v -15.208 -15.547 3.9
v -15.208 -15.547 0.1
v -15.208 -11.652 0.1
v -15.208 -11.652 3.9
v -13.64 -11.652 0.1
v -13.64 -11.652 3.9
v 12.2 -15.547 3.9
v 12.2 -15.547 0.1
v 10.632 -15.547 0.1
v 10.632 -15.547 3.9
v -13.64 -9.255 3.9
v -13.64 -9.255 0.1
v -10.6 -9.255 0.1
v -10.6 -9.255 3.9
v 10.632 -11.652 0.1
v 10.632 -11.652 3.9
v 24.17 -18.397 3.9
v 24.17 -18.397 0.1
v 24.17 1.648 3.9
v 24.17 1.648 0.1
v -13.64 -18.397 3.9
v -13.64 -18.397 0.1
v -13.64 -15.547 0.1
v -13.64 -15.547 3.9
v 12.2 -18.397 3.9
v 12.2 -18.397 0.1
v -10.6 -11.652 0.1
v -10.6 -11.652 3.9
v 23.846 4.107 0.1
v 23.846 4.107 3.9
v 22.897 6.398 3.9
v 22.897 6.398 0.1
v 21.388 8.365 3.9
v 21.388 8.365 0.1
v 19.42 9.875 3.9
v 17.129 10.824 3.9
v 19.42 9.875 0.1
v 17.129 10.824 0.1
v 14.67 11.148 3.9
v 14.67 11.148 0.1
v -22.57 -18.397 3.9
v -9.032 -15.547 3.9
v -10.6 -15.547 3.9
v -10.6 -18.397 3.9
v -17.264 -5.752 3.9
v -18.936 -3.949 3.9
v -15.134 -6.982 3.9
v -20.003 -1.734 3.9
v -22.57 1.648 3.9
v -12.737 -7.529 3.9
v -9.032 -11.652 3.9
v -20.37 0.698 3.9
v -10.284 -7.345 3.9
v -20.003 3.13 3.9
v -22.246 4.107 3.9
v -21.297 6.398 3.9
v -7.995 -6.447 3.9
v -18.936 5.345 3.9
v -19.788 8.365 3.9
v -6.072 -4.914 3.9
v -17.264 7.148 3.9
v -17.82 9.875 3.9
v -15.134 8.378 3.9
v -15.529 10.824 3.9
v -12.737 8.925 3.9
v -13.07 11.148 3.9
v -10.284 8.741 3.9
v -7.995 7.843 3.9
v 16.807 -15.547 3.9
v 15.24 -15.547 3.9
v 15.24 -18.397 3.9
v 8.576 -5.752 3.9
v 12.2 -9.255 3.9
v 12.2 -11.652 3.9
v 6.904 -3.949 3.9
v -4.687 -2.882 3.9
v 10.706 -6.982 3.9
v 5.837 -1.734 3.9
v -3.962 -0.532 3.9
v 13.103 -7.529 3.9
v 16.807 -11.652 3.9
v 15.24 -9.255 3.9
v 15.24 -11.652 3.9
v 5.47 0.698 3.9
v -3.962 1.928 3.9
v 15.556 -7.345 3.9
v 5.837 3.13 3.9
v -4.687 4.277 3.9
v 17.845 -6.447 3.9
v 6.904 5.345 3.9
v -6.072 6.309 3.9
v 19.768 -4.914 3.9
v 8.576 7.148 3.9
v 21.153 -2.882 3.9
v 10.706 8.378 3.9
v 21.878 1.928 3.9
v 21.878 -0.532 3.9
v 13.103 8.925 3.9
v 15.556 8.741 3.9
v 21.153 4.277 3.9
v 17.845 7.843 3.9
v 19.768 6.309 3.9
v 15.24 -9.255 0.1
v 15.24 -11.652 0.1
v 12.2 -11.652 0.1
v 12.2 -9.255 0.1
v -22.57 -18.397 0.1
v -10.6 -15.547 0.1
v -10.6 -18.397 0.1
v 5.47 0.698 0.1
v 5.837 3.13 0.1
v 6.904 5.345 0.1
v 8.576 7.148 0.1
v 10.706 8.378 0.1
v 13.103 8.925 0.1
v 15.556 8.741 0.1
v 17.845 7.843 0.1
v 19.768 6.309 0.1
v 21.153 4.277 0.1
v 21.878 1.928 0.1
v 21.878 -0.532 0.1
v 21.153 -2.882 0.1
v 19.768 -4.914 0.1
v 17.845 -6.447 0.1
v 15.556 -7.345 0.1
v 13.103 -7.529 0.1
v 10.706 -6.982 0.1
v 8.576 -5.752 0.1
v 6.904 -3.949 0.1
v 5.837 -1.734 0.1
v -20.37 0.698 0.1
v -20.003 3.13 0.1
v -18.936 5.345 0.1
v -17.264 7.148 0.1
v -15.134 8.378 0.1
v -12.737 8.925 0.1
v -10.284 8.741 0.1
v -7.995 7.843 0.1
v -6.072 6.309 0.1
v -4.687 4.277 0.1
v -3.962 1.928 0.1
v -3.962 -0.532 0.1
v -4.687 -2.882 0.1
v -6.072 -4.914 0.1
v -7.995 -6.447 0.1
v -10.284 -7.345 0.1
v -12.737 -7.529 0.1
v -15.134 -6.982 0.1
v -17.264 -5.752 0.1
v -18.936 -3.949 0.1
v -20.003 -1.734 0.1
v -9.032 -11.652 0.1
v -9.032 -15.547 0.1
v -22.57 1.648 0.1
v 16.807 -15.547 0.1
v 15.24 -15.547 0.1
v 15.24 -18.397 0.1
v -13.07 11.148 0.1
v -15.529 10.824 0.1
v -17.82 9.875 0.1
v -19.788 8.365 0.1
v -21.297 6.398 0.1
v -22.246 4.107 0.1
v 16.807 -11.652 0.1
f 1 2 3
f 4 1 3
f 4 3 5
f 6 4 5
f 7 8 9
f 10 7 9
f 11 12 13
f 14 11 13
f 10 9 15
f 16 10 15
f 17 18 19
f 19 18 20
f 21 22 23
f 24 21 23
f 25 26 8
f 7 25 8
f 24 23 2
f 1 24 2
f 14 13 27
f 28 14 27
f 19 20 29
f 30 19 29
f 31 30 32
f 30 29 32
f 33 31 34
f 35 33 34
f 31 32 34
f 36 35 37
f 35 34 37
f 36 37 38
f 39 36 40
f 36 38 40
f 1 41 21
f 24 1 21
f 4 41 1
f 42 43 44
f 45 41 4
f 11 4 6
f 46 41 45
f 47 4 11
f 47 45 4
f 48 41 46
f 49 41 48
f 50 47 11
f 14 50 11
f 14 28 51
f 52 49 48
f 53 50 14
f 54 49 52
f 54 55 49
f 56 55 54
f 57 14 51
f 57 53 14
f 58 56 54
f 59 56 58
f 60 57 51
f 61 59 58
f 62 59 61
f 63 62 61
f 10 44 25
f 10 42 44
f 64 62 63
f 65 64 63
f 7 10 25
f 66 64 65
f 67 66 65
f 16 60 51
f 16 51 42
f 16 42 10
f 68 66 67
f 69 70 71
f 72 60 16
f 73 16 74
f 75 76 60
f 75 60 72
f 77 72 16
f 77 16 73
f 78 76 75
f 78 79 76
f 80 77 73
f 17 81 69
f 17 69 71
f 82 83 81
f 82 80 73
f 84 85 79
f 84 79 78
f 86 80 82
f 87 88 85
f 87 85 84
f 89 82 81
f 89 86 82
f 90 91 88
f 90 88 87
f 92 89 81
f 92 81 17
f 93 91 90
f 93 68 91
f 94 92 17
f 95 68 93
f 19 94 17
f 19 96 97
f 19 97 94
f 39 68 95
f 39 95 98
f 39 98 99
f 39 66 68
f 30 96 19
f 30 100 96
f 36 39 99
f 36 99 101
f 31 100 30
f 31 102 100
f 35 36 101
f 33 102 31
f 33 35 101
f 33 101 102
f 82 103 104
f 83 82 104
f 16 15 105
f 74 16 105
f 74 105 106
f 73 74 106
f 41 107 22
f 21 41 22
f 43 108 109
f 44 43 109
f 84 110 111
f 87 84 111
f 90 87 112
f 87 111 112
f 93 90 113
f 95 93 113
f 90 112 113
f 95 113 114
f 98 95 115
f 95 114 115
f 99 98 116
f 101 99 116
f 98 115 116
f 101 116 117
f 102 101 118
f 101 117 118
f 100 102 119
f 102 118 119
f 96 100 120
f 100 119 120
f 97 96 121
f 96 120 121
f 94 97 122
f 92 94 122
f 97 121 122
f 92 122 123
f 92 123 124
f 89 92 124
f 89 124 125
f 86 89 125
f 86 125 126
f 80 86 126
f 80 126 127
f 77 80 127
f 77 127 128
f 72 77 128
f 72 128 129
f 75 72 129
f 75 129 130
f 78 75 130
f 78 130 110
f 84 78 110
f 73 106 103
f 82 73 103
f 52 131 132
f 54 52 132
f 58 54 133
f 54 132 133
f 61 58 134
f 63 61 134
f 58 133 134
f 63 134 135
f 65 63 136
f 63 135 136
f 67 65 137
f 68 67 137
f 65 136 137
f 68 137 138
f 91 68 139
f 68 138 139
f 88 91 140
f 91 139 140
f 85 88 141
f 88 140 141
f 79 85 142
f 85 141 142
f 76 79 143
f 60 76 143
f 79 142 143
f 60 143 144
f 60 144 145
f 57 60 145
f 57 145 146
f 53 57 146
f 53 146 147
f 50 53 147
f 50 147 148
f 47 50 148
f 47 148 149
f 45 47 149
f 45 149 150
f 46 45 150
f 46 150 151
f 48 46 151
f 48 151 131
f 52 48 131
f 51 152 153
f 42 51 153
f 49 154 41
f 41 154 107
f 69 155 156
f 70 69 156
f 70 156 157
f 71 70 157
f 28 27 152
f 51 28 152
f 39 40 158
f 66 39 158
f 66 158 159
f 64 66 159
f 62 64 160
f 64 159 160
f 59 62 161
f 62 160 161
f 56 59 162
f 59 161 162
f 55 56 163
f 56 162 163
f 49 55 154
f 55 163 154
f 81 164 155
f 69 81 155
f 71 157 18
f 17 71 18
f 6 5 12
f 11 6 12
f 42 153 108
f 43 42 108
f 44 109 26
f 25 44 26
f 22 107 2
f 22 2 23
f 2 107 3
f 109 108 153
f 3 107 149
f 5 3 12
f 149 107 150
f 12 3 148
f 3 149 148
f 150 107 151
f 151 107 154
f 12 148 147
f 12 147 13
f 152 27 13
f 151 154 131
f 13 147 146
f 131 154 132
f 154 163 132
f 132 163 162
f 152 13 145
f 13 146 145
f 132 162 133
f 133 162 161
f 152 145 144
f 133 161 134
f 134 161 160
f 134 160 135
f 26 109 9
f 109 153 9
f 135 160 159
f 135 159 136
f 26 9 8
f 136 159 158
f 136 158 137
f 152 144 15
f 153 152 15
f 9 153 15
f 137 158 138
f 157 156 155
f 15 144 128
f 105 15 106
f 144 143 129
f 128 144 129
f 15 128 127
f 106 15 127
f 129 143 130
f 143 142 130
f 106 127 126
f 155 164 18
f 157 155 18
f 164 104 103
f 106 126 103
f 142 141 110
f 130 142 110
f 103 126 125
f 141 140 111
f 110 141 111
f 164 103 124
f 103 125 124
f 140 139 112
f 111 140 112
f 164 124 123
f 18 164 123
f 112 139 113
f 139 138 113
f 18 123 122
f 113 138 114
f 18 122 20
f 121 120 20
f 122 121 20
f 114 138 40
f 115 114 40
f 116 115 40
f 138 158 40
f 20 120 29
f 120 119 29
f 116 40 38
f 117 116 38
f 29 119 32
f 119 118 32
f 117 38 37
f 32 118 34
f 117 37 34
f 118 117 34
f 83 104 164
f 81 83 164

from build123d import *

# Parameters (mm, degrees)
ESBO_O1_R                = 8.05
RESSALTO_EXTRUS_O1_DEPTH = 4
ESCALA1_SCALE            = 0.95
ESBO_O2_R                = 8.25
ESBO_O2_R_2              = 7.6475
CORTE_EXTRUS_O1_DEPTH    = 10


with BuildPart() as part:
    # Esboço1 → Ressalto-extrusão1 (new body)
    with BuildSketch(Plane.XY):
        with BuildLine():
            Line((-9.55, -16.1), (-11.2, -16.1))
            Line((-11.2, -16.1), (-11.2, -18.526258263))
            Line((-11.2, -18.526258263), (-11.2, -19.1))
            Line((-11.2, -19.1), (12.8, -19.1))
            Line((12.8, -19.1), (12.8, -18.526258263))
            Line((12.8, -18.526258263), (12.8, -16.1))
            Line((12.8, -16.1), (11.15, -16.1))
            Line((11.15, -16.1), (11.15, -12))
            Line((11.15, -12), (12.8, -12))
            Line((12.8, -12), (12.8, -9.47671964))
            Line((12.8, -9.47671964), (16, -9.47671964))
            Line((16, -9.47671964), (16, -12))
            Line((16, -12), (17.65, -12))
            Line((17.65, -12), (17.65, -16.1))
            Line((17.65, -16.1), (16, -16.1))
            Line((16, -16.1), (16, -18.526258263))
            Line((16, -18.526258263), (16, -19.1))
            Line((16, -19.1), (25.4, -19.1))
            Line((25.4, -19.1), (25.4, 2))
            ThreePointArc((25.4, 2), (22.471067812, 9.071067812), (15.4, 12))
            Line((15.4, 12), (-13.8, 12))
            ThreePointArc((-13.8, 12), (-20.871067812, 9.071067812), (-23.8, 2))
            Line((-23.8, 2), (-23.8, -19.1))
            Line((-23.8, -19.1), (-14.4, -19.1))
            Line((-14.4, -19.1), (-14.4, -16.1))
            Line((-14.4, -16.1), (-16.05, -16.1))
            Line((-16.05, -16.1), (-16.05, -12))
            Line((-16.05, -12), (-14.4, -12))
            Line((-14.4, -12), (-14.4, -9.47671964))
            Line((-14.4, -9.47671964), (-11.2, -9.47671964))
            Line((-11.2, -9.47671964), (-11.2, -12))
            Line((-11.2, -12), (-9.55, -12))
            Line((-9.55, -12), (-9.55, -16.1))
        make_face()
        with Locations((-12.8, 1)):
            Circle(ESBO_O1_R, mode=Mode.SUBTRACT)
        with Locations((14.4, 1)):
            Circle(ESBO_O1_R, mode=Mode.SUBTRACT)
    extrude(amount=RESSALTO_EXTRUS_O1_DEPTH)


with BuildPart() as part_1:
    # Escala1: scaled about (0.8, -5.041502423, 2)
    add(part.part.scale(ESCALA1_SCALE).moved(Location((0.04, -0.252075121, 0.1))))

    # Esboço2 → Corte-extrusão1 (cut)
    # profile 1 of 2: a face of its own
    with BuildSketch(Plane(origin=(0, 0, 0.1), x_dir=(-1, 0, 0), z_dir=(0, 0, -1))):
        with Locations((12.12, 0.697924879)):
            Circle(ESBO_O2_R)
        with Locations((12.12, 0.697924879)):
            Circle(ESBO_O2_R_2, mode=Mode.SUBTRACT)
    # profile 2 of 2: a face of its own
    with BuildSketch(Plane(origin=(0, 0, 0.1), x_dir=(-1, 0, 0), z_dir=(0, 0, -1))):
        with Locations((-13.72, 0.697924879)):
            Circle(ESBO_O2_R)
        with Locations((-13.72, 0.697924879)):
            Circle(ESBO_O2_R_2, mode=Mode.SUBTRACT)
    extrude(amount=-CORTE_EXTRUS_O1_DEPTH, mode=Mode.SUBTRACT)


solid = part_1.part
